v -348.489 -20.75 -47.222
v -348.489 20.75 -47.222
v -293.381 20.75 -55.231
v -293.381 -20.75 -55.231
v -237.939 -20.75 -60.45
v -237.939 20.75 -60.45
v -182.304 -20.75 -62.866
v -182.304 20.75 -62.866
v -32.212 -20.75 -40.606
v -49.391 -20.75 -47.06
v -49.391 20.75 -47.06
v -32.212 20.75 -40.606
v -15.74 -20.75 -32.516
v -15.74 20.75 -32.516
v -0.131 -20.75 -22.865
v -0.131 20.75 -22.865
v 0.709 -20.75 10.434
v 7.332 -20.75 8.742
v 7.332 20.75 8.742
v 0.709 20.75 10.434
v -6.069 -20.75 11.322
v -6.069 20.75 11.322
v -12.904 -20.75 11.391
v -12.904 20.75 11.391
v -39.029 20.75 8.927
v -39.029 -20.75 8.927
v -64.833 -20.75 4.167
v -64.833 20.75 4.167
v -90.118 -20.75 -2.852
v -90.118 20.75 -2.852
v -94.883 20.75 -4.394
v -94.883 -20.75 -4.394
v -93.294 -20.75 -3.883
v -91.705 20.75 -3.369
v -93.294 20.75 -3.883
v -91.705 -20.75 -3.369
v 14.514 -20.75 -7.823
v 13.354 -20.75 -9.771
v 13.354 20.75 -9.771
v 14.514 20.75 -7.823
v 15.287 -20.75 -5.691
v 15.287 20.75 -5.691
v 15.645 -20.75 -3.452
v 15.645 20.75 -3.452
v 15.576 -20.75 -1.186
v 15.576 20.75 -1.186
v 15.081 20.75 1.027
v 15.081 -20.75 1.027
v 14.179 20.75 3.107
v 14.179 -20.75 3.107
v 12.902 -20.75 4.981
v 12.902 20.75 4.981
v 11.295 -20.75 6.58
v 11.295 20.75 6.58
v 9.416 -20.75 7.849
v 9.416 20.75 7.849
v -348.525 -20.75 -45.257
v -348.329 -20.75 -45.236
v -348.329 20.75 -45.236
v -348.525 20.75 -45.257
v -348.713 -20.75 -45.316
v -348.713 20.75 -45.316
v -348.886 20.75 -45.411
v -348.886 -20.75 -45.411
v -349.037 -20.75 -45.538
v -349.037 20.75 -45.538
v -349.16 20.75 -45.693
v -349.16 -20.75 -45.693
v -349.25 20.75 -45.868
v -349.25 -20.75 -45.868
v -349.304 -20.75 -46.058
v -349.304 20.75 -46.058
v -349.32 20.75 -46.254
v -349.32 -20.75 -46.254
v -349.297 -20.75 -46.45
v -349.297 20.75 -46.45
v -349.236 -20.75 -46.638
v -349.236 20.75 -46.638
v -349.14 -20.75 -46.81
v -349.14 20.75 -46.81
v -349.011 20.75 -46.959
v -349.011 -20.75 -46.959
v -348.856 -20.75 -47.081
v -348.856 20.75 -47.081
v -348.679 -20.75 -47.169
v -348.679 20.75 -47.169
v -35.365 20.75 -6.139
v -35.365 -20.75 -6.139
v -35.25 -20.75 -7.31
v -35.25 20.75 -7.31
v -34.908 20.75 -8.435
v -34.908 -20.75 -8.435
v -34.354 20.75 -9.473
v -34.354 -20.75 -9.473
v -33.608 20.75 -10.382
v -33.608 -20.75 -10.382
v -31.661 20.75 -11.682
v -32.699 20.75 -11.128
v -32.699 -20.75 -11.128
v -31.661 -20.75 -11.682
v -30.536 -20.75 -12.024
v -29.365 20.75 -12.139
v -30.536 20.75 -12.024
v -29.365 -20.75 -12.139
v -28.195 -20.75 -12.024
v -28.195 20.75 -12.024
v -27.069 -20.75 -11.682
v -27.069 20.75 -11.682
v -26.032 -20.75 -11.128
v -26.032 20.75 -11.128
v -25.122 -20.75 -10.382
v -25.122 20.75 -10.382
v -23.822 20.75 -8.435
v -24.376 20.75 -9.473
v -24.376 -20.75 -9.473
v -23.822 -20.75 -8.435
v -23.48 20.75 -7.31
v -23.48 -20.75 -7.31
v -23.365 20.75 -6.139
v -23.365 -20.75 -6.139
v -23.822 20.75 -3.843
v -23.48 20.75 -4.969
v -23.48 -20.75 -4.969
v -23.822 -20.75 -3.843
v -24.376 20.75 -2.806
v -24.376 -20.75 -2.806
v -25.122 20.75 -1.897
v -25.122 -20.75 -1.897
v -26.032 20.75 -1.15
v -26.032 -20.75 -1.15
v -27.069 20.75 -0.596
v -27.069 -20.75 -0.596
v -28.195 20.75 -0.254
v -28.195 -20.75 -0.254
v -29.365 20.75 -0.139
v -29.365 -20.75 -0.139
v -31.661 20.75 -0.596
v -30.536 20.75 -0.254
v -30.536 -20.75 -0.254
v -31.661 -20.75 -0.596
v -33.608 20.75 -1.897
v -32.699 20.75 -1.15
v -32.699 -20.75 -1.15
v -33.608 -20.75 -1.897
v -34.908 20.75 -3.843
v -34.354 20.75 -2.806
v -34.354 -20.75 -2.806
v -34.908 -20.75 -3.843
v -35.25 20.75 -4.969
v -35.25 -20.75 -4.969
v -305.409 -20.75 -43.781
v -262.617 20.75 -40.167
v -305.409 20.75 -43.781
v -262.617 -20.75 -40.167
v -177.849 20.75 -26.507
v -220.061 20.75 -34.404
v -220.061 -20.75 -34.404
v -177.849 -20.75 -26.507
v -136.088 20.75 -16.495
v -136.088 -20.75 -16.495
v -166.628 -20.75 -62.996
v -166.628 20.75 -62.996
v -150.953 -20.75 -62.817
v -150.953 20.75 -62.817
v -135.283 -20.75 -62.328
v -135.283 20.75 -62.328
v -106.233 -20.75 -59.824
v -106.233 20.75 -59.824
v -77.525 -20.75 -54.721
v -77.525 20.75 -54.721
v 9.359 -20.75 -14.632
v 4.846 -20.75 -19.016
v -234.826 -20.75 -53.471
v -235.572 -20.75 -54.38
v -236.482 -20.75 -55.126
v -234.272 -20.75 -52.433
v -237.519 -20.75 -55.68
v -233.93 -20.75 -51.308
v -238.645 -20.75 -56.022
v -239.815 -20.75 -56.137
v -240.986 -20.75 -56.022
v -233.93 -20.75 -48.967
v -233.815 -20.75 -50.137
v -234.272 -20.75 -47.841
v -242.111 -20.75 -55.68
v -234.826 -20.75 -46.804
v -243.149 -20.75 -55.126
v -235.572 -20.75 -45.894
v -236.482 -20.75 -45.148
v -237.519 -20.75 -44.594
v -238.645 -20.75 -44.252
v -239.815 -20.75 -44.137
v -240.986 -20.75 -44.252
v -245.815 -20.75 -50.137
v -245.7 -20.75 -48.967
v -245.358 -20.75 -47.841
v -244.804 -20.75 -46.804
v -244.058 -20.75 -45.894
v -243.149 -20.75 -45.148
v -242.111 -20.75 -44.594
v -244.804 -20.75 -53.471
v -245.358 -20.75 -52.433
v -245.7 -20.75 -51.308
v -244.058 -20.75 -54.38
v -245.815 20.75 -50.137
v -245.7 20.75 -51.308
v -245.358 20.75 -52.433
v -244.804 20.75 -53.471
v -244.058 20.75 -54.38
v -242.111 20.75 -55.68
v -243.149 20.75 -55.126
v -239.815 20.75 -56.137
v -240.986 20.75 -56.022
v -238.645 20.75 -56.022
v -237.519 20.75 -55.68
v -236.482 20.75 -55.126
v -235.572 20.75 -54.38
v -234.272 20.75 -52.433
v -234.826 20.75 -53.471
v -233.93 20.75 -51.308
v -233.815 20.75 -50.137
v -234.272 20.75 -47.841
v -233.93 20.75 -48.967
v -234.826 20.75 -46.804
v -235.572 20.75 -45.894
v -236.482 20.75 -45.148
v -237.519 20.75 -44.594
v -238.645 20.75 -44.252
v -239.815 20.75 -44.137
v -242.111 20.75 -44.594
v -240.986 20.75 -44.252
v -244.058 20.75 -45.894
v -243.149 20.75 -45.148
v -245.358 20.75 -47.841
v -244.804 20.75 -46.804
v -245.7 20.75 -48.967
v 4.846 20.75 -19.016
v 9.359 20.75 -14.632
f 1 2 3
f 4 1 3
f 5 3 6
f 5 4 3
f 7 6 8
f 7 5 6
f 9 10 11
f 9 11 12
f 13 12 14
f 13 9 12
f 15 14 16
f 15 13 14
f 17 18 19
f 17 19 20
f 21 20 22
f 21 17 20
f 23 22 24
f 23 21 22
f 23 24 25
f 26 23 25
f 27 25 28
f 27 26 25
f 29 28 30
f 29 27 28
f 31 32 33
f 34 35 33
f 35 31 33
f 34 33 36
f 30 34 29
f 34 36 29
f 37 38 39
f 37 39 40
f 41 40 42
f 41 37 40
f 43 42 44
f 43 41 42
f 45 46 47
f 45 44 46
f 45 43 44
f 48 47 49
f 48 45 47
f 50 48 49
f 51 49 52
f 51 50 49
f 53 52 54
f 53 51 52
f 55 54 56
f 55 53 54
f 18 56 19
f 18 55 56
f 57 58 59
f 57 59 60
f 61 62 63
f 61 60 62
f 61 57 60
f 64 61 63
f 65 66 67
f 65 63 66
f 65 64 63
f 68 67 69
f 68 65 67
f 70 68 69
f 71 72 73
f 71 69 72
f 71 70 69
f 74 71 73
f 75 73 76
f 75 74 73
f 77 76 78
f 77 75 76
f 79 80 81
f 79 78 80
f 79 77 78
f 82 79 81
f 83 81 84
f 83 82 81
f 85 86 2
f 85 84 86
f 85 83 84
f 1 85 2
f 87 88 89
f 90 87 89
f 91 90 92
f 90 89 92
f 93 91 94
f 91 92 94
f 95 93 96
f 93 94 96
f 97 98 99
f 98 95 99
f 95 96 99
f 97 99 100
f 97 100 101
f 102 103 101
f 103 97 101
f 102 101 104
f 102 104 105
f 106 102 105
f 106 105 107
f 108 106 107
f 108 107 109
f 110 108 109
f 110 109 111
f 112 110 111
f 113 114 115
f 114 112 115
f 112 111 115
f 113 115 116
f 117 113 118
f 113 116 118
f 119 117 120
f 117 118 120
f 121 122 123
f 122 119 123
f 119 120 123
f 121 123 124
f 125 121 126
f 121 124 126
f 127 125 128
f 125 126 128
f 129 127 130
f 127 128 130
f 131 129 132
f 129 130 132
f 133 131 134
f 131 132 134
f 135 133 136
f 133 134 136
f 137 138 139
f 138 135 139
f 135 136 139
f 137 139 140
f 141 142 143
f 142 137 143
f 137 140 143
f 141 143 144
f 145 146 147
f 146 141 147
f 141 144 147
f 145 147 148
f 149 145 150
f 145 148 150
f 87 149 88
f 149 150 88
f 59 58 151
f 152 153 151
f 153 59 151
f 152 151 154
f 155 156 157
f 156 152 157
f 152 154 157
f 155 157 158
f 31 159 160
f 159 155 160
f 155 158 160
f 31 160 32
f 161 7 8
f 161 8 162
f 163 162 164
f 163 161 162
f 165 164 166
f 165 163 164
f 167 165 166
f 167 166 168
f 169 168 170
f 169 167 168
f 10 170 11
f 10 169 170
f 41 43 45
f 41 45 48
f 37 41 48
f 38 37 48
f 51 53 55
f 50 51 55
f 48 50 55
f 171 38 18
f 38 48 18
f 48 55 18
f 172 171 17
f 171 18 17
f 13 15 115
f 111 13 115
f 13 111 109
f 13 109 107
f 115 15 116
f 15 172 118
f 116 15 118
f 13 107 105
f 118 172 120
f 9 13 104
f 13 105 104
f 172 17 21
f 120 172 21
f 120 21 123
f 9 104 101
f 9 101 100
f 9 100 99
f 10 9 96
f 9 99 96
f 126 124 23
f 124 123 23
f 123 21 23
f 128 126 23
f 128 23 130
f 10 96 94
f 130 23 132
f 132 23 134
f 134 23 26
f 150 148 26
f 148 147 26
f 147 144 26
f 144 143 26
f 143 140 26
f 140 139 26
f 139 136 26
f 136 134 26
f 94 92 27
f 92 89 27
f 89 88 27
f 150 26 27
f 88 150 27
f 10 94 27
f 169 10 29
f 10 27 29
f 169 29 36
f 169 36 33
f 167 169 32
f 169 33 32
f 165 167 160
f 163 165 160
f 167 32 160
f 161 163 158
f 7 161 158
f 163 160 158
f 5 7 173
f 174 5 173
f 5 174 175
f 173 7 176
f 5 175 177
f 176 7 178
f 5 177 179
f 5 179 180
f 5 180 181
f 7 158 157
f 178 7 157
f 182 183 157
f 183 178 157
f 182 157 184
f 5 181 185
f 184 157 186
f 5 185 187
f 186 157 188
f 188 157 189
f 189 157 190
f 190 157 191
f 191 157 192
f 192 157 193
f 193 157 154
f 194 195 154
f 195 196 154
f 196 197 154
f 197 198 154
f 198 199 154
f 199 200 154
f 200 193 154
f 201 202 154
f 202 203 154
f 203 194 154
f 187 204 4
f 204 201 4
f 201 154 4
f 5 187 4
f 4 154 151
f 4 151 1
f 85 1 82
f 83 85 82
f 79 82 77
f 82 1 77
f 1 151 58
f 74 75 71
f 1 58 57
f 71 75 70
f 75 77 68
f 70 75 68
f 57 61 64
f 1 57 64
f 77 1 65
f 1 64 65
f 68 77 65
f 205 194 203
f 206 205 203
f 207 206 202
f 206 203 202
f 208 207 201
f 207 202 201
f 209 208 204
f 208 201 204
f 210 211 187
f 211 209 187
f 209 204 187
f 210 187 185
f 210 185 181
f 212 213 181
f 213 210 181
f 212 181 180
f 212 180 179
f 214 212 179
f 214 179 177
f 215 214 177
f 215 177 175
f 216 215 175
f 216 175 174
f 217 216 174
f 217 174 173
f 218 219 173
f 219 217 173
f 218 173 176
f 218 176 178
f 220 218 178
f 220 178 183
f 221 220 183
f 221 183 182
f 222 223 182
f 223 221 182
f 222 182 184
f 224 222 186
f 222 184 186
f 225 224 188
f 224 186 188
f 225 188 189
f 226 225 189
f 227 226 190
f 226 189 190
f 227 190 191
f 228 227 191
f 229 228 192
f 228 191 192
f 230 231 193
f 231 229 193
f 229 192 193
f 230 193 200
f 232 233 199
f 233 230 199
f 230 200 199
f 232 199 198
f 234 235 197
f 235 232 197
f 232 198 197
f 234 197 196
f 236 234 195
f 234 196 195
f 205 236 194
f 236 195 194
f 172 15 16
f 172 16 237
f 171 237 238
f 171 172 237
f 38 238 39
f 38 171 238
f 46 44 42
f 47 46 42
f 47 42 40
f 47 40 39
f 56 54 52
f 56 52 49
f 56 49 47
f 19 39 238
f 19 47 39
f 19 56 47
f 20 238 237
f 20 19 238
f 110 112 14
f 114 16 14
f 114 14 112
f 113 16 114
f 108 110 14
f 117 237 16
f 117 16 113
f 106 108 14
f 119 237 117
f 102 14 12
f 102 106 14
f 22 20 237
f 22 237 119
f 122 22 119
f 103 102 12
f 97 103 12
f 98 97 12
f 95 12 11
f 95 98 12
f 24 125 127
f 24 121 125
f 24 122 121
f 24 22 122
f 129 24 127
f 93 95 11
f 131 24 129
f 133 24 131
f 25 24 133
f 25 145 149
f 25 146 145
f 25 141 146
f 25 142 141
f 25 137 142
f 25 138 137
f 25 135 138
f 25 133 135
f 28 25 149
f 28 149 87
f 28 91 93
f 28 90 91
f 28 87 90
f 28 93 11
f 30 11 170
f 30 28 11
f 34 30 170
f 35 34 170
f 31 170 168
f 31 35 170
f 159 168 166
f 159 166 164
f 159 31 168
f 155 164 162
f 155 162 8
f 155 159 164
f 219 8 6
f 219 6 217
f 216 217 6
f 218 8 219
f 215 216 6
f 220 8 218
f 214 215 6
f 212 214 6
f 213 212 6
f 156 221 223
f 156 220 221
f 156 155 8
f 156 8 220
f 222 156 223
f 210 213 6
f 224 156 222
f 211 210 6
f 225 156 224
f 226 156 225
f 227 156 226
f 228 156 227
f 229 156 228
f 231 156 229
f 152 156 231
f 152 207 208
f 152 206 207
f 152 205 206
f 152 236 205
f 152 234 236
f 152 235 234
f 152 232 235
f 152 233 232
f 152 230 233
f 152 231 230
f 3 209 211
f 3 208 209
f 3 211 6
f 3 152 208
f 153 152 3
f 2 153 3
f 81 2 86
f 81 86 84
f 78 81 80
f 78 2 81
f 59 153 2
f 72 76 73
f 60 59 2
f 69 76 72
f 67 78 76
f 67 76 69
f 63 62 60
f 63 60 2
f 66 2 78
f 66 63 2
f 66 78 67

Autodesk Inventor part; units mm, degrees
ref_plane "YZ Plane" through (0, 0, 0) normal (1, 0, 0) x (0, 1, 0)
ref_plane "XZ Plane" through (0, 0, 0) normal (0, 1, 0) x (-1, 0, 0)
ref_plane "XY Plane" through (0, 0, 0) normal (0, 0, 1) x (1, 0, 0)
sketch "スケッチ1" plane through (0, 0, 0) normal (0, 1, 0) x (-1, 0, 0)
  arc A0 (182.3045, -62.8657) -> (348.4892, -47.2216) centre (162.2533, 1040.6287) ccw projected
  arc A1 (135.2834, -62.3282) -> (182.3045, -62.8657) centre (167.871, 731.467) ccw projected
  arc A2 (49.3906, -47.0603) -> (135.2834, -62.3282) centre (148.588, 261.756) ccw projected
  arc A3 (0.1309, -22.8654) -> (49.3906, -47.0603) centre (107.173, 132.825) ccw projected
  arc A4 (-13.3538, -9.7713) -> (0.1309, -22.8654) centre (31.9, 23.342) ccw projected
  arc A5 (-7.3318, 8.7424) -> (-13.3538, -9.7713) centre (-3.6695, -2.6851) ccw projected
  arc A6 (12.9042, 11.391) -> (-7.3318, 8.7424) centre (10.0641, -45.5382) ccw projected
  arc A7 (90.1175, -2.8524) -> (12.9042, 11.391) centre (-1.8944, -285.2401) ccw projected
  arc A8 (90.1175, -2.8524) -> (94.8834, -4.3943) centre (462.8125, 1140.9603) ccw projected
  arc A9 (94.8834, -4.3943) -> (348.3291, -45.236) centre (355.7675, 807.7316) ccw projected
  arc A10 (348.4892, -47.2216) -> (348.3291, -45.236) centre (348.3204, -46.2359) ccw projected
  circle A11 centre (29.3651, -6.1392) radius 6 projected
  circle A12 centre (239.8151, -50.1371) radius 6 projected
  point P0 (0, 0)
extrude "押し出し1" add sketch "スケッチ1" along normal mid plane 41.5
properties part number "uretan_m" material "ポリエチレン、高密度"
